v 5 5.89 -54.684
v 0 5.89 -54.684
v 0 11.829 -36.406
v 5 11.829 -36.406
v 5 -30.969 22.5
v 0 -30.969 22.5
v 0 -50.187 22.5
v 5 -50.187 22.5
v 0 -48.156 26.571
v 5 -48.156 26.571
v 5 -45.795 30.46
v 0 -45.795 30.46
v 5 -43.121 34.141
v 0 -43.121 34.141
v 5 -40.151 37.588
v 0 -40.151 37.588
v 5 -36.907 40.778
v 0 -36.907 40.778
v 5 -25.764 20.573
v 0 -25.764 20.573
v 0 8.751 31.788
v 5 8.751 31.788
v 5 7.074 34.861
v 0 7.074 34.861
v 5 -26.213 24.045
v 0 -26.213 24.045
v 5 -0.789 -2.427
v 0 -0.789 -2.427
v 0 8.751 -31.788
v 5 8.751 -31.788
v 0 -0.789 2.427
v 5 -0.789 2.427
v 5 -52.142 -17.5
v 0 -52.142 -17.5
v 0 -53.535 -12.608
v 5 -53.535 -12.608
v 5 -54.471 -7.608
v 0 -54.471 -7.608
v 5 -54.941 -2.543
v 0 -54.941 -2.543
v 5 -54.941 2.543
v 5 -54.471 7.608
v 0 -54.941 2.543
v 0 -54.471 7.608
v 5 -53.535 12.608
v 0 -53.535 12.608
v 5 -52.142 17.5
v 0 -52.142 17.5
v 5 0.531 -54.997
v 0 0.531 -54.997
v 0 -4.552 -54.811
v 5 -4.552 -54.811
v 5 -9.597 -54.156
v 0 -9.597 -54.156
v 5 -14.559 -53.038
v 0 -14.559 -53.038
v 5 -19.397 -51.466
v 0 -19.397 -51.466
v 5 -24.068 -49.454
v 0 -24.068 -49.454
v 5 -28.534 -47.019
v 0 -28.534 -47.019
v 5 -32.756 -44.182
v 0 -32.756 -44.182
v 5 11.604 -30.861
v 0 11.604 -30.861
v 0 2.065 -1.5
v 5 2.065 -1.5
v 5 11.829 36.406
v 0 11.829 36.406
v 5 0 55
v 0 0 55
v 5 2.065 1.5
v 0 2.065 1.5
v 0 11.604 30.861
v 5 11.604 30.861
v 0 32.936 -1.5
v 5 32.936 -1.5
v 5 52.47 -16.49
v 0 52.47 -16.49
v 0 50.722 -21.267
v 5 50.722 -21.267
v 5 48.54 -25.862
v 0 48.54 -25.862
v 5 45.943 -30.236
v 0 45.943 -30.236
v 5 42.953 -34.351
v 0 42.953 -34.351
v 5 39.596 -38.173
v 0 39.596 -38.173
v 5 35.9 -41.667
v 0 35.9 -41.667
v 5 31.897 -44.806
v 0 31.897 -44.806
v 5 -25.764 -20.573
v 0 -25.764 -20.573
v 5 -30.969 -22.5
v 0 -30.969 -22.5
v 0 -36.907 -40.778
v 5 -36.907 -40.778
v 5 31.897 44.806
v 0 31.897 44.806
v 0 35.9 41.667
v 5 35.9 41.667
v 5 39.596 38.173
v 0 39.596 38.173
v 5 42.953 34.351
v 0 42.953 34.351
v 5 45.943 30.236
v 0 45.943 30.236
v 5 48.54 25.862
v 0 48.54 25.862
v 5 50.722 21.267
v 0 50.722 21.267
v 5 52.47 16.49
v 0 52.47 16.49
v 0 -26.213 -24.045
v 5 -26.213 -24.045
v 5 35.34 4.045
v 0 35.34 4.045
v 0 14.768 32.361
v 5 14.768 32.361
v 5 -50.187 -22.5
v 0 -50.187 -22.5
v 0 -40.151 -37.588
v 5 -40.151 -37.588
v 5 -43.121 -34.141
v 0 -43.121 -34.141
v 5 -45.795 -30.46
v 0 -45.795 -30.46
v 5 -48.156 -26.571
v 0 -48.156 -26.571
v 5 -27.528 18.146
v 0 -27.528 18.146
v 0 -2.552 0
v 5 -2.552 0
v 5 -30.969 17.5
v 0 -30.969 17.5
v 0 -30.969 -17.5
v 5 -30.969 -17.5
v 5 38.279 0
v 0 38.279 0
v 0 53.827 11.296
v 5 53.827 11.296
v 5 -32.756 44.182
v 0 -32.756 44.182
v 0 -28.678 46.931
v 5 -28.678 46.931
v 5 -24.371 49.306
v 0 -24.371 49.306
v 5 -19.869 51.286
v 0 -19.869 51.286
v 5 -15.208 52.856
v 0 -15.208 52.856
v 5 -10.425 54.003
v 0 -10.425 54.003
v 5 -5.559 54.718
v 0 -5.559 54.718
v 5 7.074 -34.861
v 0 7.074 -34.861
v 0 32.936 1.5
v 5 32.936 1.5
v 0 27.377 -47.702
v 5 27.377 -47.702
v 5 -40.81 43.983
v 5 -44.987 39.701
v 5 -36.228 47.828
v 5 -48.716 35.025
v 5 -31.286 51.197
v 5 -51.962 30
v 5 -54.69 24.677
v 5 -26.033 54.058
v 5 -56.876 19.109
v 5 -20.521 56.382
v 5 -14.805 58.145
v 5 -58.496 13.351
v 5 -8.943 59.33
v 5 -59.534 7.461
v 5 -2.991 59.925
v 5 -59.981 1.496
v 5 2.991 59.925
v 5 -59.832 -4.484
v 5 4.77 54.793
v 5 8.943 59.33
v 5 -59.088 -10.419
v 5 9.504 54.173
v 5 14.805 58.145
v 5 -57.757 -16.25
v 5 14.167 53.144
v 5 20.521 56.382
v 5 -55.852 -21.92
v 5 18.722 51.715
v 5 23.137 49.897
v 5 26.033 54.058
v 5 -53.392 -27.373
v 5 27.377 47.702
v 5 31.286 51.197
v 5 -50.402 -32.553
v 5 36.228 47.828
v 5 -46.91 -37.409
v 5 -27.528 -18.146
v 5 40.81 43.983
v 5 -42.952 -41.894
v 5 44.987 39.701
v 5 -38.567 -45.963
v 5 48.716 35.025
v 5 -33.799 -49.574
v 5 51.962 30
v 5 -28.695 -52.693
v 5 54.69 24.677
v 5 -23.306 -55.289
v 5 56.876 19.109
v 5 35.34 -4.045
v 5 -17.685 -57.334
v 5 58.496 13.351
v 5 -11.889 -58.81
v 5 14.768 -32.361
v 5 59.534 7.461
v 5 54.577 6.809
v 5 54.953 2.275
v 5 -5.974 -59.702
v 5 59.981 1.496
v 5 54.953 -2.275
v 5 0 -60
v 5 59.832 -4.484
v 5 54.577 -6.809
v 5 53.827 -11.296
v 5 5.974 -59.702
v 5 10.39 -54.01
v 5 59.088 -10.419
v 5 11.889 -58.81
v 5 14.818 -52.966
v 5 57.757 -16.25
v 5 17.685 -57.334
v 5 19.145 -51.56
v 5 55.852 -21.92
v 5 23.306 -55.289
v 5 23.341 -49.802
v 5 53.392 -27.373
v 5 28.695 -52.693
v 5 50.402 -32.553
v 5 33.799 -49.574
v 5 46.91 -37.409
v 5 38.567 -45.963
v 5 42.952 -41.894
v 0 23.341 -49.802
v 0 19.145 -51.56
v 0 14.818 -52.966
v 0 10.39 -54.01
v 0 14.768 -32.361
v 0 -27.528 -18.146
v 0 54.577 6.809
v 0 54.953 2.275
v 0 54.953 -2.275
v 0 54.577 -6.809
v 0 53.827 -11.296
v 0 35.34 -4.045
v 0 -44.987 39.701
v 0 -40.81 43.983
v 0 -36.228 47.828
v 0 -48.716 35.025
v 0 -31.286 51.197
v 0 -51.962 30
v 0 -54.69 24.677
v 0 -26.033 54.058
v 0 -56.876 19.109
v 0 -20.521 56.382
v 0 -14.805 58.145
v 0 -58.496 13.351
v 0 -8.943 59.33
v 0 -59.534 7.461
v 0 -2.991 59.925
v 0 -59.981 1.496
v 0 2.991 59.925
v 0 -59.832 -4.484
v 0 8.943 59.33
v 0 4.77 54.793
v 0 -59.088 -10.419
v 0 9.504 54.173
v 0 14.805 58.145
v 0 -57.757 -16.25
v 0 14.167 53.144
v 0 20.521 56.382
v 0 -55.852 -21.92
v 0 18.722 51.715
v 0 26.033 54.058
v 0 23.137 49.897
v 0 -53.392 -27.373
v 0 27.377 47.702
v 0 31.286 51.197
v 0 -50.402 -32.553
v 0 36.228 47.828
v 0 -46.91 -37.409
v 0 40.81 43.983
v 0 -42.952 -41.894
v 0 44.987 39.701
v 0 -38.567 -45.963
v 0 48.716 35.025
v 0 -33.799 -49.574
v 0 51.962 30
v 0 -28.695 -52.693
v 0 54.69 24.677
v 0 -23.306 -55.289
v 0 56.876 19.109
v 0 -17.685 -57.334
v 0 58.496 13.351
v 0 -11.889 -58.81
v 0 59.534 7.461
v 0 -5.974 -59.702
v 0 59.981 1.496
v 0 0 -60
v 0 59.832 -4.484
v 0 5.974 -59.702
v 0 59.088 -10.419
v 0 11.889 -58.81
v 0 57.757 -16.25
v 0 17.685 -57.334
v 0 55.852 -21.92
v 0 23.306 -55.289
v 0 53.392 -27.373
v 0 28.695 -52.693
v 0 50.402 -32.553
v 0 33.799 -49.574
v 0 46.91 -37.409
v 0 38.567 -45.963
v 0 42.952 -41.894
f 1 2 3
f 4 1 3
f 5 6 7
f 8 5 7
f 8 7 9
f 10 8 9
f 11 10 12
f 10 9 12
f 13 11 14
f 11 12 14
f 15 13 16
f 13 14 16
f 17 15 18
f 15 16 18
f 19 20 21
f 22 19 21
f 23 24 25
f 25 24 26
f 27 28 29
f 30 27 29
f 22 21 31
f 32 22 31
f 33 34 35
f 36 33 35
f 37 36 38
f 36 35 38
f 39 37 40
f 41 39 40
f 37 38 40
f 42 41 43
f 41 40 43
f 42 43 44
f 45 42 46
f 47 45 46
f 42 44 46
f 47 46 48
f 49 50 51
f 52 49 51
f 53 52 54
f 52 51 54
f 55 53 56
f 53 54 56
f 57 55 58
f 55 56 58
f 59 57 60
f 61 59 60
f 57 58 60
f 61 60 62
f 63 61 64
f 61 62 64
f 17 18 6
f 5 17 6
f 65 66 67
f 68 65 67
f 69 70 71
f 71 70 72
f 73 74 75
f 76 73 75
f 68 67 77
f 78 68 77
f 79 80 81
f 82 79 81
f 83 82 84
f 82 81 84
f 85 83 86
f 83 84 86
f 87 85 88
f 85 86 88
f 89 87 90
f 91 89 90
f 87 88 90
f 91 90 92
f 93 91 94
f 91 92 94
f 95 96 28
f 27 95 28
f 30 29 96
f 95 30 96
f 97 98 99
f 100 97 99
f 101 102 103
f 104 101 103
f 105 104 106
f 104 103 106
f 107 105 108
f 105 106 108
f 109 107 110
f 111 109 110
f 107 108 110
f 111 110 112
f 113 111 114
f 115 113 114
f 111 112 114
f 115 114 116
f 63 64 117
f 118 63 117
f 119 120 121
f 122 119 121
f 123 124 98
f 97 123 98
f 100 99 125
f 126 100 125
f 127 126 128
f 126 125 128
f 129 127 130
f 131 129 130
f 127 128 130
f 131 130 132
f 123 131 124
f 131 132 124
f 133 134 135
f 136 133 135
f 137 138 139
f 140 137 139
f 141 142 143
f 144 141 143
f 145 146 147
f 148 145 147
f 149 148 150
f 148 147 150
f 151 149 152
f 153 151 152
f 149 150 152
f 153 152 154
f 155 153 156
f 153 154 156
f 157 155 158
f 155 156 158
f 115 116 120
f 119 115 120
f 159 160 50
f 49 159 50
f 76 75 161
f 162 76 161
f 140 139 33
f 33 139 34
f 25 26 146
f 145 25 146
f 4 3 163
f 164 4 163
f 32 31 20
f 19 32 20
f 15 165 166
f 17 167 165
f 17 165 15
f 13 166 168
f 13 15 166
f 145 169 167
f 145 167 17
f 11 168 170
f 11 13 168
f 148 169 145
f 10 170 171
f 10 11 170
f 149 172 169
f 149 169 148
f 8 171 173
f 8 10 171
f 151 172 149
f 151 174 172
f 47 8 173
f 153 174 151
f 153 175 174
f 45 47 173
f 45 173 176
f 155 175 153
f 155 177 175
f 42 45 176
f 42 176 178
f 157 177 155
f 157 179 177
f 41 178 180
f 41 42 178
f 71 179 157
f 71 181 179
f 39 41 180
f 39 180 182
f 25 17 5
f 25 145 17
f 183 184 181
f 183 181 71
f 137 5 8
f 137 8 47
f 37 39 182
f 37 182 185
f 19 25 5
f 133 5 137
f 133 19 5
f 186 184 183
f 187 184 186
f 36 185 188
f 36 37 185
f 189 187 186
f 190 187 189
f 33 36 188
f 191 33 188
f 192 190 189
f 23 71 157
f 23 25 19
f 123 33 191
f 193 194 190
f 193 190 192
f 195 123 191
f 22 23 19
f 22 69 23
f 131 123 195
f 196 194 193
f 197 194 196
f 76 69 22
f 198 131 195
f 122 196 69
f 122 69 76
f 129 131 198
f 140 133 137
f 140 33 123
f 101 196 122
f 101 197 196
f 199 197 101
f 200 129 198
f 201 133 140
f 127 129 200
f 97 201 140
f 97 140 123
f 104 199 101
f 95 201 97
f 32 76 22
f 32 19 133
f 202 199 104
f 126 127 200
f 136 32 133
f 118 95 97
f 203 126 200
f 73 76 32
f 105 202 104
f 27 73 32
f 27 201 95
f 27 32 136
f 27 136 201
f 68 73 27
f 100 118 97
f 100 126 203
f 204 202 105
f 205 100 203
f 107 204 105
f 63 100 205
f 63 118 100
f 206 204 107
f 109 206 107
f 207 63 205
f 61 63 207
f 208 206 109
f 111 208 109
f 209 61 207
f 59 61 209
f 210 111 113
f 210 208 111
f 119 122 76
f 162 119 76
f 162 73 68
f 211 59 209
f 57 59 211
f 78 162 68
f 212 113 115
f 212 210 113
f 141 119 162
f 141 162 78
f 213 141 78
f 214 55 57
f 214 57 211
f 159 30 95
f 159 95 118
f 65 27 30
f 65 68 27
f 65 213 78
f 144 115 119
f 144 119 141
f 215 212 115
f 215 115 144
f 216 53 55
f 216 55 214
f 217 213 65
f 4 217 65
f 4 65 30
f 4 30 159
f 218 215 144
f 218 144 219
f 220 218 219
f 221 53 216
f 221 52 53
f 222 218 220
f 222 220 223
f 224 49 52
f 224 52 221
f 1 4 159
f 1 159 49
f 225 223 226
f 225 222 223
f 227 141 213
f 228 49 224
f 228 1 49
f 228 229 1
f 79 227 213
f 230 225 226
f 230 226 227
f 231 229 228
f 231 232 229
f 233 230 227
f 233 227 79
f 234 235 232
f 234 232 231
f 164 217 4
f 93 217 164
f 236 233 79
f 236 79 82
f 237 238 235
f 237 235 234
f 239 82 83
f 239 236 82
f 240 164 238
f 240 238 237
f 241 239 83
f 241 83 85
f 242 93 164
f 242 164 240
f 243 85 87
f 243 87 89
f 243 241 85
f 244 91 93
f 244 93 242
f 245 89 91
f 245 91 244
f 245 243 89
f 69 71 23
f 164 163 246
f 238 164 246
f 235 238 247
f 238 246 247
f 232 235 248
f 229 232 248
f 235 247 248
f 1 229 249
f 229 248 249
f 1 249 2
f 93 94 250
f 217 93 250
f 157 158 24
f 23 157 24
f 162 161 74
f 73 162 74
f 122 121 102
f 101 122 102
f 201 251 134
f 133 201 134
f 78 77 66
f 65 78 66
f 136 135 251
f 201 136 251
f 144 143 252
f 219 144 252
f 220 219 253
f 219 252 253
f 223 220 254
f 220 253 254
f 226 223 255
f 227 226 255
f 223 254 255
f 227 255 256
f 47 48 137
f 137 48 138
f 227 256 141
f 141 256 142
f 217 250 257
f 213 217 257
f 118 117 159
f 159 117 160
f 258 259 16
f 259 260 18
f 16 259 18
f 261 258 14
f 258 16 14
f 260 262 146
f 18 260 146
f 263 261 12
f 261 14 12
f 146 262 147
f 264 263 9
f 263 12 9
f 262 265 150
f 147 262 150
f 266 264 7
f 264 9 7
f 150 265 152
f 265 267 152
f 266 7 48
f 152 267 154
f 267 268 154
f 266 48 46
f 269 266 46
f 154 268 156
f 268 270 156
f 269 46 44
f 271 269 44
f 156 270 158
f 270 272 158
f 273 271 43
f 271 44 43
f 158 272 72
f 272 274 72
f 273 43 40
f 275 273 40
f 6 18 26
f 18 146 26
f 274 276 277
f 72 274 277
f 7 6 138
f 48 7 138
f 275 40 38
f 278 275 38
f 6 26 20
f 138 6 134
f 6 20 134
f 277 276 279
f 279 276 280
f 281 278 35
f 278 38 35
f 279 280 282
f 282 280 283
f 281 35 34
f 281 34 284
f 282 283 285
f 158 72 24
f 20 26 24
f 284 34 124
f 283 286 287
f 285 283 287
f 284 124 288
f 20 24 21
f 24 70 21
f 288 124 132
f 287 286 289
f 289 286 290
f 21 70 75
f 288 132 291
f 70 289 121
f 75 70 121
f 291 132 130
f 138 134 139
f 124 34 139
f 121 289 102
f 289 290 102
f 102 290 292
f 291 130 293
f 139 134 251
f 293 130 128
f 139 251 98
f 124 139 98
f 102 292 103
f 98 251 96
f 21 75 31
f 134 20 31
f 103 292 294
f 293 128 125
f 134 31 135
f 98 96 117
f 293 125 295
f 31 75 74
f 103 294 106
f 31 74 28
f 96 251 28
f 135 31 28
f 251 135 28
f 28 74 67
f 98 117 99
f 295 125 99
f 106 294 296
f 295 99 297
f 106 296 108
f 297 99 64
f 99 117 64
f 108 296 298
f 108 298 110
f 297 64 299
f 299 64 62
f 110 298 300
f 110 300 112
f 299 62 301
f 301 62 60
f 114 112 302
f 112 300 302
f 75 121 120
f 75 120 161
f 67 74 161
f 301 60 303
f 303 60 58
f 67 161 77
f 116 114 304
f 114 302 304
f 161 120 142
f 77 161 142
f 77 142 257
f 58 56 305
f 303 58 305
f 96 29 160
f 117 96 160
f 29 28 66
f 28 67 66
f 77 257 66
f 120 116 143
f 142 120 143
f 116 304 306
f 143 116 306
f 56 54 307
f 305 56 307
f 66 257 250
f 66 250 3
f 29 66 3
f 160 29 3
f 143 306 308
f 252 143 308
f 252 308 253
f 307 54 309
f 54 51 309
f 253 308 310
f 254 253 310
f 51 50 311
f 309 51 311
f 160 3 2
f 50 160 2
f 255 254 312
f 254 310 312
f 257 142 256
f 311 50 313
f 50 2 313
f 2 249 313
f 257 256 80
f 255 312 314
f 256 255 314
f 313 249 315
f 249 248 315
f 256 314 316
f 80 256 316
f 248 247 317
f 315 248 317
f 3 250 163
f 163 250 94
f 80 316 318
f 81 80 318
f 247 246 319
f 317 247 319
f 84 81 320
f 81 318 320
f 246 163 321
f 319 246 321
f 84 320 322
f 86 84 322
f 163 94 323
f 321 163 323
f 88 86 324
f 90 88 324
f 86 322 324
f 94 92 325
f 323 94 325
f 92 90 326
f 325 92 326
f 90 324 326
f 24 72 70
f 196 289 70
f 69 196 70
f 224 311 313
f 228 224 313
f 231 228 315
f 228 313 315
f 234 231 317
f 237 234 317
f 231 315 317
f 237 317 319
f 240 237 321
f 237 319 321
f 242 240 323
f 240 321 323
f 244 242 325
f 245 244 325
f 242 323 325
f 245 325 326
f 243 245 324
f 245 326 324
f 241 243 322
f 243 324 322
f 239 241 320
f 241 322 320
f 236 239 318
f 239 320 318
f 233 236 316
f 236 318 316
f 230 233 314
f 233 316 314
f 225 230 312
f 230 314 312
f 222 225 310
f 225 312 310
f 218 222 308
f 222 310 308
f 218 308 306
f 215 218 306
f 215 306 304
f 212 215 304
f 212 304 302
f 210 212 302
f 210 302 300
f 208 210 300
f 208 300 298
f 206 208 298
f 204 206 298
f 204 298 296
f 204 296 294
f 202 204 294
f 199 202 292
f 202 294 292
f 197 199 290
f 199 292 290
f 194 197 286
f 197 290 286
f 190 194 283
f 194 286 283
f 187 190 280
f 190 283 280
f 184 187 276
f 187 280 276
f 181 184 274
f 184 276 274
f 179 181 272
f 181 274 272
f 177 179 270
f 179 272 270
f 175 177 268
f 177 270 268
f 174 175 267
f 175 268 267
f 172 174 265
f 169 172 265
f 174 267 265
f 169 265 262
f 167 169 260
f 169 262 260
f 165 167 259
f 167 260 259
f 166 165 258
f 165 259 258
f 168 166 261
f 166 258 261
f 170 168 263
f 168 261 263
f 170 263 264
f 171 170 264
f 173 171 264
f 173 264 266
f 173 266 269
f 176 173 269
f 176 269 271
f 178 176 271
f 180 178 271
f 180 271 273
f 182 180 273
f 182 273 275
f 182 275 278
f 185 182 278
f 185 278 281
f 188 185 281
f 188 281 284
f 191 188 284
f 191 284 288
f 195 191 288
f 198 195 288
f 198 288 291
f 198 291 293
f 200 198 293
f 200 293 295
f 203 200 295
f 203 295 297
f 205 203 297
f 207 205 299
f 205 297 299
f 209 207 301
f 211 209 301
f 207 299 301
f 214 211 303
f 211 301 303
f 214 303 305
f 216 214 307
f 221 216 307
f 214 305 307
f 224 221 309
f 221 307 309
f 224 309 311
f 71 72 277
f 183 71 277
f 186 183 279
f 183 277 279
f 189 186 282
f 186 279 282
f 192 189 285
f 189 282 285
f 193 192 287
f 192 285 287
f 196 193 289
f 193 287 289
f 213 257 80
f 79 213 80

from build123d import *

# Parameters (mm, degrees)
SKETCH2_R           = 60
BOSS_EXTRUDE2_DEPTH = 5


with BuildPart() as part:
    # Sketch2 → Boss-Extrude2 (new body)
    with BuildSketch(Plane(origin=(0, 0, 0), x_dir=(0, 0, -1), z_dir=(1, 0, 0))):
        Circle(SKETCH2_R)
        with BuildLine():
            Line((-32.360679775, 14.767876284), (-44.805880919, 31.897226135))
            ThreePointArc((-44.805880919, 31.897226135), (-32.328188876, 44.495934691), (-16.490286116, 52.469709965))
            Line((-16.490286116, 52.469709965), (-4.045084972, 35.340360114))
            Line((-4.045084972, 35.340360114), (-32.360679775, 14.767876284))
        make_face(mode=Mode.SUBTRACT)
        with BuildLine():
            Line((-47.702148851, 27.37708887), (-36.405764747, 11.828950023))
            Line((-36.405764747, 11.828950023), (-55, 0))
            ThreePointArc((-55, 0), (-53.144229164, 14.166541801), (-47.702148851, 27.37708887))
        make_face(mode=Mode.SUBTRACT)
        with BuildLine():
            Line((0, 38.279286376), (-11.296384104, 53.827425223))
            ThreePointArc((-11.296384104, 53.827425223), (0, 55), (11.296384104, 53.827425223))
            Line((11.296384104, 53.827425223), (0, 38.279286376))
        make_face(mode=Mode.SUBTRACT)
        with BuildLine():
            Line((-54.718344288, -5.559028547), (-34.860679775, 7.073667441))
            Line((-34.860679775, 7.073667441), (-24.045084972, -26.213310629))
            Line((-24.045084972, -26.213310629), (-44.181843419, -32.756140067))
            ThreePointArc((-44.181843419, -32.756140067), (-51.285792388, -19.868756859), (-54.718344288, -5.559028547))
        make_face(mode=Mode.SUBTRACT)
        with BuildLine():
            Line((4.045084972, 35.340360114), (16.490286116, 52.469709965))
            ThreePointArc((16.490286116, 52.469709965), (32.328188876, 44.495934691), (44.805880919, 31.897226135))
            Line((44.805880919, 31.897226135), (32.360679775, 14.767876284))
            Line((32.360679775, 14.767876284), (4.045084972, 35.340360114))
        make_face(mode=Mode.SUBTRACT)
        with BuildLine():
            Line((-40.77793343, -36.907453789), (-22.5, -30.968593211))
            Line((-22.5, -30.968593211), (-22.5, -50.18714975))
            ThreePointArc((-22.5, -50.18714975), (-32.328188876, -44.495934691), (-40.77793343, -36.907453789))
        make_face(mode=Mode.SUBTRACT)
        with BuildLine():
            Line((36.405764747, 11.828950023), (47.702148851, 27.37708887))
            ThreePointArc((47.702148851, 27.37708887), (52.308108396, 16.995934691), (54.683698177, 5.890089445))
            Line((54.683698177, 5.890089445), (36.405764747, 11.828950023))
        make_face(mode=Mode.SUBTRACT)
        with BuildLine():
            Line((-17.5, -52.141634037), (-17.5, -30.968593211))
            Line((-17.5, -30.968593211), (17.5, -30.968593211))
            Line((17.5, -30.968593211), (17.5, -52.141634037))
            ThreePointArc((17.5, -52.141634037), (0, -55), (-17.5, -52.141634037))
        make_face(mode=Mode.SUBTRACT)
        with BuildLine():
            Line((34.860679775, 7.073667441), (54.997438222, 0.530838003))
            ThreePointArc((54.997438222, 0.530838003), (52.308108396, -16.995934691), (44.181843419, -32.756140067))
            Line((44.181843419, -32.756140067), (24.045084972, -26.213310629))
            Line((24.045084972, -26.213310629), (34.860679775, 7.073667441))
        make_face(mode=Mode.SUBTRACT)
        with BuildLine():
            Line((22.5, -50.18714975), (22.5, -30.968593211))
            Line((22.5, -30.968593211), (40.77793343, -36.907453789))
            ThreePointArc((40.77793343, -36.907453789), (32.328188876, -44.495934691), (22.5, -50.18714975))
        make_face(mode=Mode.SUBTRACT)
        Polygon((-20.572949017, -25.764282653), (-31.787730758, 8.751266486), (-2.427050983, -0.788596668), align=None, mode=Mode.SUBTRACT)
        Polygon((18.145898034, -27.527638409), (-18.145898034, -27.527638409), (0, -2.551952425), align=None, mode=Mode.SUBTRACT)
        Polygon((31.787730758, 8.751266486), (20.572949017, -25.764282653), (2.427050983, -0.788596668), align=None, mode=Mode.SUBTRACT)
        Polygon((-30.860679775, 11.604436034), (-1.5, 32.936218542), (-1.5, 2.064572881), align=None, mode=Mode.SUBTRACT)
        Polygon((1.5, 32.936218542), (30.860679775, 11.604436034), (1.5, 2.064572881), align=None, mode=Mode.SUBTRACT)
    extrude(amount=BOSS_EXTRUDE2_DEPTH)


solid = part.part
